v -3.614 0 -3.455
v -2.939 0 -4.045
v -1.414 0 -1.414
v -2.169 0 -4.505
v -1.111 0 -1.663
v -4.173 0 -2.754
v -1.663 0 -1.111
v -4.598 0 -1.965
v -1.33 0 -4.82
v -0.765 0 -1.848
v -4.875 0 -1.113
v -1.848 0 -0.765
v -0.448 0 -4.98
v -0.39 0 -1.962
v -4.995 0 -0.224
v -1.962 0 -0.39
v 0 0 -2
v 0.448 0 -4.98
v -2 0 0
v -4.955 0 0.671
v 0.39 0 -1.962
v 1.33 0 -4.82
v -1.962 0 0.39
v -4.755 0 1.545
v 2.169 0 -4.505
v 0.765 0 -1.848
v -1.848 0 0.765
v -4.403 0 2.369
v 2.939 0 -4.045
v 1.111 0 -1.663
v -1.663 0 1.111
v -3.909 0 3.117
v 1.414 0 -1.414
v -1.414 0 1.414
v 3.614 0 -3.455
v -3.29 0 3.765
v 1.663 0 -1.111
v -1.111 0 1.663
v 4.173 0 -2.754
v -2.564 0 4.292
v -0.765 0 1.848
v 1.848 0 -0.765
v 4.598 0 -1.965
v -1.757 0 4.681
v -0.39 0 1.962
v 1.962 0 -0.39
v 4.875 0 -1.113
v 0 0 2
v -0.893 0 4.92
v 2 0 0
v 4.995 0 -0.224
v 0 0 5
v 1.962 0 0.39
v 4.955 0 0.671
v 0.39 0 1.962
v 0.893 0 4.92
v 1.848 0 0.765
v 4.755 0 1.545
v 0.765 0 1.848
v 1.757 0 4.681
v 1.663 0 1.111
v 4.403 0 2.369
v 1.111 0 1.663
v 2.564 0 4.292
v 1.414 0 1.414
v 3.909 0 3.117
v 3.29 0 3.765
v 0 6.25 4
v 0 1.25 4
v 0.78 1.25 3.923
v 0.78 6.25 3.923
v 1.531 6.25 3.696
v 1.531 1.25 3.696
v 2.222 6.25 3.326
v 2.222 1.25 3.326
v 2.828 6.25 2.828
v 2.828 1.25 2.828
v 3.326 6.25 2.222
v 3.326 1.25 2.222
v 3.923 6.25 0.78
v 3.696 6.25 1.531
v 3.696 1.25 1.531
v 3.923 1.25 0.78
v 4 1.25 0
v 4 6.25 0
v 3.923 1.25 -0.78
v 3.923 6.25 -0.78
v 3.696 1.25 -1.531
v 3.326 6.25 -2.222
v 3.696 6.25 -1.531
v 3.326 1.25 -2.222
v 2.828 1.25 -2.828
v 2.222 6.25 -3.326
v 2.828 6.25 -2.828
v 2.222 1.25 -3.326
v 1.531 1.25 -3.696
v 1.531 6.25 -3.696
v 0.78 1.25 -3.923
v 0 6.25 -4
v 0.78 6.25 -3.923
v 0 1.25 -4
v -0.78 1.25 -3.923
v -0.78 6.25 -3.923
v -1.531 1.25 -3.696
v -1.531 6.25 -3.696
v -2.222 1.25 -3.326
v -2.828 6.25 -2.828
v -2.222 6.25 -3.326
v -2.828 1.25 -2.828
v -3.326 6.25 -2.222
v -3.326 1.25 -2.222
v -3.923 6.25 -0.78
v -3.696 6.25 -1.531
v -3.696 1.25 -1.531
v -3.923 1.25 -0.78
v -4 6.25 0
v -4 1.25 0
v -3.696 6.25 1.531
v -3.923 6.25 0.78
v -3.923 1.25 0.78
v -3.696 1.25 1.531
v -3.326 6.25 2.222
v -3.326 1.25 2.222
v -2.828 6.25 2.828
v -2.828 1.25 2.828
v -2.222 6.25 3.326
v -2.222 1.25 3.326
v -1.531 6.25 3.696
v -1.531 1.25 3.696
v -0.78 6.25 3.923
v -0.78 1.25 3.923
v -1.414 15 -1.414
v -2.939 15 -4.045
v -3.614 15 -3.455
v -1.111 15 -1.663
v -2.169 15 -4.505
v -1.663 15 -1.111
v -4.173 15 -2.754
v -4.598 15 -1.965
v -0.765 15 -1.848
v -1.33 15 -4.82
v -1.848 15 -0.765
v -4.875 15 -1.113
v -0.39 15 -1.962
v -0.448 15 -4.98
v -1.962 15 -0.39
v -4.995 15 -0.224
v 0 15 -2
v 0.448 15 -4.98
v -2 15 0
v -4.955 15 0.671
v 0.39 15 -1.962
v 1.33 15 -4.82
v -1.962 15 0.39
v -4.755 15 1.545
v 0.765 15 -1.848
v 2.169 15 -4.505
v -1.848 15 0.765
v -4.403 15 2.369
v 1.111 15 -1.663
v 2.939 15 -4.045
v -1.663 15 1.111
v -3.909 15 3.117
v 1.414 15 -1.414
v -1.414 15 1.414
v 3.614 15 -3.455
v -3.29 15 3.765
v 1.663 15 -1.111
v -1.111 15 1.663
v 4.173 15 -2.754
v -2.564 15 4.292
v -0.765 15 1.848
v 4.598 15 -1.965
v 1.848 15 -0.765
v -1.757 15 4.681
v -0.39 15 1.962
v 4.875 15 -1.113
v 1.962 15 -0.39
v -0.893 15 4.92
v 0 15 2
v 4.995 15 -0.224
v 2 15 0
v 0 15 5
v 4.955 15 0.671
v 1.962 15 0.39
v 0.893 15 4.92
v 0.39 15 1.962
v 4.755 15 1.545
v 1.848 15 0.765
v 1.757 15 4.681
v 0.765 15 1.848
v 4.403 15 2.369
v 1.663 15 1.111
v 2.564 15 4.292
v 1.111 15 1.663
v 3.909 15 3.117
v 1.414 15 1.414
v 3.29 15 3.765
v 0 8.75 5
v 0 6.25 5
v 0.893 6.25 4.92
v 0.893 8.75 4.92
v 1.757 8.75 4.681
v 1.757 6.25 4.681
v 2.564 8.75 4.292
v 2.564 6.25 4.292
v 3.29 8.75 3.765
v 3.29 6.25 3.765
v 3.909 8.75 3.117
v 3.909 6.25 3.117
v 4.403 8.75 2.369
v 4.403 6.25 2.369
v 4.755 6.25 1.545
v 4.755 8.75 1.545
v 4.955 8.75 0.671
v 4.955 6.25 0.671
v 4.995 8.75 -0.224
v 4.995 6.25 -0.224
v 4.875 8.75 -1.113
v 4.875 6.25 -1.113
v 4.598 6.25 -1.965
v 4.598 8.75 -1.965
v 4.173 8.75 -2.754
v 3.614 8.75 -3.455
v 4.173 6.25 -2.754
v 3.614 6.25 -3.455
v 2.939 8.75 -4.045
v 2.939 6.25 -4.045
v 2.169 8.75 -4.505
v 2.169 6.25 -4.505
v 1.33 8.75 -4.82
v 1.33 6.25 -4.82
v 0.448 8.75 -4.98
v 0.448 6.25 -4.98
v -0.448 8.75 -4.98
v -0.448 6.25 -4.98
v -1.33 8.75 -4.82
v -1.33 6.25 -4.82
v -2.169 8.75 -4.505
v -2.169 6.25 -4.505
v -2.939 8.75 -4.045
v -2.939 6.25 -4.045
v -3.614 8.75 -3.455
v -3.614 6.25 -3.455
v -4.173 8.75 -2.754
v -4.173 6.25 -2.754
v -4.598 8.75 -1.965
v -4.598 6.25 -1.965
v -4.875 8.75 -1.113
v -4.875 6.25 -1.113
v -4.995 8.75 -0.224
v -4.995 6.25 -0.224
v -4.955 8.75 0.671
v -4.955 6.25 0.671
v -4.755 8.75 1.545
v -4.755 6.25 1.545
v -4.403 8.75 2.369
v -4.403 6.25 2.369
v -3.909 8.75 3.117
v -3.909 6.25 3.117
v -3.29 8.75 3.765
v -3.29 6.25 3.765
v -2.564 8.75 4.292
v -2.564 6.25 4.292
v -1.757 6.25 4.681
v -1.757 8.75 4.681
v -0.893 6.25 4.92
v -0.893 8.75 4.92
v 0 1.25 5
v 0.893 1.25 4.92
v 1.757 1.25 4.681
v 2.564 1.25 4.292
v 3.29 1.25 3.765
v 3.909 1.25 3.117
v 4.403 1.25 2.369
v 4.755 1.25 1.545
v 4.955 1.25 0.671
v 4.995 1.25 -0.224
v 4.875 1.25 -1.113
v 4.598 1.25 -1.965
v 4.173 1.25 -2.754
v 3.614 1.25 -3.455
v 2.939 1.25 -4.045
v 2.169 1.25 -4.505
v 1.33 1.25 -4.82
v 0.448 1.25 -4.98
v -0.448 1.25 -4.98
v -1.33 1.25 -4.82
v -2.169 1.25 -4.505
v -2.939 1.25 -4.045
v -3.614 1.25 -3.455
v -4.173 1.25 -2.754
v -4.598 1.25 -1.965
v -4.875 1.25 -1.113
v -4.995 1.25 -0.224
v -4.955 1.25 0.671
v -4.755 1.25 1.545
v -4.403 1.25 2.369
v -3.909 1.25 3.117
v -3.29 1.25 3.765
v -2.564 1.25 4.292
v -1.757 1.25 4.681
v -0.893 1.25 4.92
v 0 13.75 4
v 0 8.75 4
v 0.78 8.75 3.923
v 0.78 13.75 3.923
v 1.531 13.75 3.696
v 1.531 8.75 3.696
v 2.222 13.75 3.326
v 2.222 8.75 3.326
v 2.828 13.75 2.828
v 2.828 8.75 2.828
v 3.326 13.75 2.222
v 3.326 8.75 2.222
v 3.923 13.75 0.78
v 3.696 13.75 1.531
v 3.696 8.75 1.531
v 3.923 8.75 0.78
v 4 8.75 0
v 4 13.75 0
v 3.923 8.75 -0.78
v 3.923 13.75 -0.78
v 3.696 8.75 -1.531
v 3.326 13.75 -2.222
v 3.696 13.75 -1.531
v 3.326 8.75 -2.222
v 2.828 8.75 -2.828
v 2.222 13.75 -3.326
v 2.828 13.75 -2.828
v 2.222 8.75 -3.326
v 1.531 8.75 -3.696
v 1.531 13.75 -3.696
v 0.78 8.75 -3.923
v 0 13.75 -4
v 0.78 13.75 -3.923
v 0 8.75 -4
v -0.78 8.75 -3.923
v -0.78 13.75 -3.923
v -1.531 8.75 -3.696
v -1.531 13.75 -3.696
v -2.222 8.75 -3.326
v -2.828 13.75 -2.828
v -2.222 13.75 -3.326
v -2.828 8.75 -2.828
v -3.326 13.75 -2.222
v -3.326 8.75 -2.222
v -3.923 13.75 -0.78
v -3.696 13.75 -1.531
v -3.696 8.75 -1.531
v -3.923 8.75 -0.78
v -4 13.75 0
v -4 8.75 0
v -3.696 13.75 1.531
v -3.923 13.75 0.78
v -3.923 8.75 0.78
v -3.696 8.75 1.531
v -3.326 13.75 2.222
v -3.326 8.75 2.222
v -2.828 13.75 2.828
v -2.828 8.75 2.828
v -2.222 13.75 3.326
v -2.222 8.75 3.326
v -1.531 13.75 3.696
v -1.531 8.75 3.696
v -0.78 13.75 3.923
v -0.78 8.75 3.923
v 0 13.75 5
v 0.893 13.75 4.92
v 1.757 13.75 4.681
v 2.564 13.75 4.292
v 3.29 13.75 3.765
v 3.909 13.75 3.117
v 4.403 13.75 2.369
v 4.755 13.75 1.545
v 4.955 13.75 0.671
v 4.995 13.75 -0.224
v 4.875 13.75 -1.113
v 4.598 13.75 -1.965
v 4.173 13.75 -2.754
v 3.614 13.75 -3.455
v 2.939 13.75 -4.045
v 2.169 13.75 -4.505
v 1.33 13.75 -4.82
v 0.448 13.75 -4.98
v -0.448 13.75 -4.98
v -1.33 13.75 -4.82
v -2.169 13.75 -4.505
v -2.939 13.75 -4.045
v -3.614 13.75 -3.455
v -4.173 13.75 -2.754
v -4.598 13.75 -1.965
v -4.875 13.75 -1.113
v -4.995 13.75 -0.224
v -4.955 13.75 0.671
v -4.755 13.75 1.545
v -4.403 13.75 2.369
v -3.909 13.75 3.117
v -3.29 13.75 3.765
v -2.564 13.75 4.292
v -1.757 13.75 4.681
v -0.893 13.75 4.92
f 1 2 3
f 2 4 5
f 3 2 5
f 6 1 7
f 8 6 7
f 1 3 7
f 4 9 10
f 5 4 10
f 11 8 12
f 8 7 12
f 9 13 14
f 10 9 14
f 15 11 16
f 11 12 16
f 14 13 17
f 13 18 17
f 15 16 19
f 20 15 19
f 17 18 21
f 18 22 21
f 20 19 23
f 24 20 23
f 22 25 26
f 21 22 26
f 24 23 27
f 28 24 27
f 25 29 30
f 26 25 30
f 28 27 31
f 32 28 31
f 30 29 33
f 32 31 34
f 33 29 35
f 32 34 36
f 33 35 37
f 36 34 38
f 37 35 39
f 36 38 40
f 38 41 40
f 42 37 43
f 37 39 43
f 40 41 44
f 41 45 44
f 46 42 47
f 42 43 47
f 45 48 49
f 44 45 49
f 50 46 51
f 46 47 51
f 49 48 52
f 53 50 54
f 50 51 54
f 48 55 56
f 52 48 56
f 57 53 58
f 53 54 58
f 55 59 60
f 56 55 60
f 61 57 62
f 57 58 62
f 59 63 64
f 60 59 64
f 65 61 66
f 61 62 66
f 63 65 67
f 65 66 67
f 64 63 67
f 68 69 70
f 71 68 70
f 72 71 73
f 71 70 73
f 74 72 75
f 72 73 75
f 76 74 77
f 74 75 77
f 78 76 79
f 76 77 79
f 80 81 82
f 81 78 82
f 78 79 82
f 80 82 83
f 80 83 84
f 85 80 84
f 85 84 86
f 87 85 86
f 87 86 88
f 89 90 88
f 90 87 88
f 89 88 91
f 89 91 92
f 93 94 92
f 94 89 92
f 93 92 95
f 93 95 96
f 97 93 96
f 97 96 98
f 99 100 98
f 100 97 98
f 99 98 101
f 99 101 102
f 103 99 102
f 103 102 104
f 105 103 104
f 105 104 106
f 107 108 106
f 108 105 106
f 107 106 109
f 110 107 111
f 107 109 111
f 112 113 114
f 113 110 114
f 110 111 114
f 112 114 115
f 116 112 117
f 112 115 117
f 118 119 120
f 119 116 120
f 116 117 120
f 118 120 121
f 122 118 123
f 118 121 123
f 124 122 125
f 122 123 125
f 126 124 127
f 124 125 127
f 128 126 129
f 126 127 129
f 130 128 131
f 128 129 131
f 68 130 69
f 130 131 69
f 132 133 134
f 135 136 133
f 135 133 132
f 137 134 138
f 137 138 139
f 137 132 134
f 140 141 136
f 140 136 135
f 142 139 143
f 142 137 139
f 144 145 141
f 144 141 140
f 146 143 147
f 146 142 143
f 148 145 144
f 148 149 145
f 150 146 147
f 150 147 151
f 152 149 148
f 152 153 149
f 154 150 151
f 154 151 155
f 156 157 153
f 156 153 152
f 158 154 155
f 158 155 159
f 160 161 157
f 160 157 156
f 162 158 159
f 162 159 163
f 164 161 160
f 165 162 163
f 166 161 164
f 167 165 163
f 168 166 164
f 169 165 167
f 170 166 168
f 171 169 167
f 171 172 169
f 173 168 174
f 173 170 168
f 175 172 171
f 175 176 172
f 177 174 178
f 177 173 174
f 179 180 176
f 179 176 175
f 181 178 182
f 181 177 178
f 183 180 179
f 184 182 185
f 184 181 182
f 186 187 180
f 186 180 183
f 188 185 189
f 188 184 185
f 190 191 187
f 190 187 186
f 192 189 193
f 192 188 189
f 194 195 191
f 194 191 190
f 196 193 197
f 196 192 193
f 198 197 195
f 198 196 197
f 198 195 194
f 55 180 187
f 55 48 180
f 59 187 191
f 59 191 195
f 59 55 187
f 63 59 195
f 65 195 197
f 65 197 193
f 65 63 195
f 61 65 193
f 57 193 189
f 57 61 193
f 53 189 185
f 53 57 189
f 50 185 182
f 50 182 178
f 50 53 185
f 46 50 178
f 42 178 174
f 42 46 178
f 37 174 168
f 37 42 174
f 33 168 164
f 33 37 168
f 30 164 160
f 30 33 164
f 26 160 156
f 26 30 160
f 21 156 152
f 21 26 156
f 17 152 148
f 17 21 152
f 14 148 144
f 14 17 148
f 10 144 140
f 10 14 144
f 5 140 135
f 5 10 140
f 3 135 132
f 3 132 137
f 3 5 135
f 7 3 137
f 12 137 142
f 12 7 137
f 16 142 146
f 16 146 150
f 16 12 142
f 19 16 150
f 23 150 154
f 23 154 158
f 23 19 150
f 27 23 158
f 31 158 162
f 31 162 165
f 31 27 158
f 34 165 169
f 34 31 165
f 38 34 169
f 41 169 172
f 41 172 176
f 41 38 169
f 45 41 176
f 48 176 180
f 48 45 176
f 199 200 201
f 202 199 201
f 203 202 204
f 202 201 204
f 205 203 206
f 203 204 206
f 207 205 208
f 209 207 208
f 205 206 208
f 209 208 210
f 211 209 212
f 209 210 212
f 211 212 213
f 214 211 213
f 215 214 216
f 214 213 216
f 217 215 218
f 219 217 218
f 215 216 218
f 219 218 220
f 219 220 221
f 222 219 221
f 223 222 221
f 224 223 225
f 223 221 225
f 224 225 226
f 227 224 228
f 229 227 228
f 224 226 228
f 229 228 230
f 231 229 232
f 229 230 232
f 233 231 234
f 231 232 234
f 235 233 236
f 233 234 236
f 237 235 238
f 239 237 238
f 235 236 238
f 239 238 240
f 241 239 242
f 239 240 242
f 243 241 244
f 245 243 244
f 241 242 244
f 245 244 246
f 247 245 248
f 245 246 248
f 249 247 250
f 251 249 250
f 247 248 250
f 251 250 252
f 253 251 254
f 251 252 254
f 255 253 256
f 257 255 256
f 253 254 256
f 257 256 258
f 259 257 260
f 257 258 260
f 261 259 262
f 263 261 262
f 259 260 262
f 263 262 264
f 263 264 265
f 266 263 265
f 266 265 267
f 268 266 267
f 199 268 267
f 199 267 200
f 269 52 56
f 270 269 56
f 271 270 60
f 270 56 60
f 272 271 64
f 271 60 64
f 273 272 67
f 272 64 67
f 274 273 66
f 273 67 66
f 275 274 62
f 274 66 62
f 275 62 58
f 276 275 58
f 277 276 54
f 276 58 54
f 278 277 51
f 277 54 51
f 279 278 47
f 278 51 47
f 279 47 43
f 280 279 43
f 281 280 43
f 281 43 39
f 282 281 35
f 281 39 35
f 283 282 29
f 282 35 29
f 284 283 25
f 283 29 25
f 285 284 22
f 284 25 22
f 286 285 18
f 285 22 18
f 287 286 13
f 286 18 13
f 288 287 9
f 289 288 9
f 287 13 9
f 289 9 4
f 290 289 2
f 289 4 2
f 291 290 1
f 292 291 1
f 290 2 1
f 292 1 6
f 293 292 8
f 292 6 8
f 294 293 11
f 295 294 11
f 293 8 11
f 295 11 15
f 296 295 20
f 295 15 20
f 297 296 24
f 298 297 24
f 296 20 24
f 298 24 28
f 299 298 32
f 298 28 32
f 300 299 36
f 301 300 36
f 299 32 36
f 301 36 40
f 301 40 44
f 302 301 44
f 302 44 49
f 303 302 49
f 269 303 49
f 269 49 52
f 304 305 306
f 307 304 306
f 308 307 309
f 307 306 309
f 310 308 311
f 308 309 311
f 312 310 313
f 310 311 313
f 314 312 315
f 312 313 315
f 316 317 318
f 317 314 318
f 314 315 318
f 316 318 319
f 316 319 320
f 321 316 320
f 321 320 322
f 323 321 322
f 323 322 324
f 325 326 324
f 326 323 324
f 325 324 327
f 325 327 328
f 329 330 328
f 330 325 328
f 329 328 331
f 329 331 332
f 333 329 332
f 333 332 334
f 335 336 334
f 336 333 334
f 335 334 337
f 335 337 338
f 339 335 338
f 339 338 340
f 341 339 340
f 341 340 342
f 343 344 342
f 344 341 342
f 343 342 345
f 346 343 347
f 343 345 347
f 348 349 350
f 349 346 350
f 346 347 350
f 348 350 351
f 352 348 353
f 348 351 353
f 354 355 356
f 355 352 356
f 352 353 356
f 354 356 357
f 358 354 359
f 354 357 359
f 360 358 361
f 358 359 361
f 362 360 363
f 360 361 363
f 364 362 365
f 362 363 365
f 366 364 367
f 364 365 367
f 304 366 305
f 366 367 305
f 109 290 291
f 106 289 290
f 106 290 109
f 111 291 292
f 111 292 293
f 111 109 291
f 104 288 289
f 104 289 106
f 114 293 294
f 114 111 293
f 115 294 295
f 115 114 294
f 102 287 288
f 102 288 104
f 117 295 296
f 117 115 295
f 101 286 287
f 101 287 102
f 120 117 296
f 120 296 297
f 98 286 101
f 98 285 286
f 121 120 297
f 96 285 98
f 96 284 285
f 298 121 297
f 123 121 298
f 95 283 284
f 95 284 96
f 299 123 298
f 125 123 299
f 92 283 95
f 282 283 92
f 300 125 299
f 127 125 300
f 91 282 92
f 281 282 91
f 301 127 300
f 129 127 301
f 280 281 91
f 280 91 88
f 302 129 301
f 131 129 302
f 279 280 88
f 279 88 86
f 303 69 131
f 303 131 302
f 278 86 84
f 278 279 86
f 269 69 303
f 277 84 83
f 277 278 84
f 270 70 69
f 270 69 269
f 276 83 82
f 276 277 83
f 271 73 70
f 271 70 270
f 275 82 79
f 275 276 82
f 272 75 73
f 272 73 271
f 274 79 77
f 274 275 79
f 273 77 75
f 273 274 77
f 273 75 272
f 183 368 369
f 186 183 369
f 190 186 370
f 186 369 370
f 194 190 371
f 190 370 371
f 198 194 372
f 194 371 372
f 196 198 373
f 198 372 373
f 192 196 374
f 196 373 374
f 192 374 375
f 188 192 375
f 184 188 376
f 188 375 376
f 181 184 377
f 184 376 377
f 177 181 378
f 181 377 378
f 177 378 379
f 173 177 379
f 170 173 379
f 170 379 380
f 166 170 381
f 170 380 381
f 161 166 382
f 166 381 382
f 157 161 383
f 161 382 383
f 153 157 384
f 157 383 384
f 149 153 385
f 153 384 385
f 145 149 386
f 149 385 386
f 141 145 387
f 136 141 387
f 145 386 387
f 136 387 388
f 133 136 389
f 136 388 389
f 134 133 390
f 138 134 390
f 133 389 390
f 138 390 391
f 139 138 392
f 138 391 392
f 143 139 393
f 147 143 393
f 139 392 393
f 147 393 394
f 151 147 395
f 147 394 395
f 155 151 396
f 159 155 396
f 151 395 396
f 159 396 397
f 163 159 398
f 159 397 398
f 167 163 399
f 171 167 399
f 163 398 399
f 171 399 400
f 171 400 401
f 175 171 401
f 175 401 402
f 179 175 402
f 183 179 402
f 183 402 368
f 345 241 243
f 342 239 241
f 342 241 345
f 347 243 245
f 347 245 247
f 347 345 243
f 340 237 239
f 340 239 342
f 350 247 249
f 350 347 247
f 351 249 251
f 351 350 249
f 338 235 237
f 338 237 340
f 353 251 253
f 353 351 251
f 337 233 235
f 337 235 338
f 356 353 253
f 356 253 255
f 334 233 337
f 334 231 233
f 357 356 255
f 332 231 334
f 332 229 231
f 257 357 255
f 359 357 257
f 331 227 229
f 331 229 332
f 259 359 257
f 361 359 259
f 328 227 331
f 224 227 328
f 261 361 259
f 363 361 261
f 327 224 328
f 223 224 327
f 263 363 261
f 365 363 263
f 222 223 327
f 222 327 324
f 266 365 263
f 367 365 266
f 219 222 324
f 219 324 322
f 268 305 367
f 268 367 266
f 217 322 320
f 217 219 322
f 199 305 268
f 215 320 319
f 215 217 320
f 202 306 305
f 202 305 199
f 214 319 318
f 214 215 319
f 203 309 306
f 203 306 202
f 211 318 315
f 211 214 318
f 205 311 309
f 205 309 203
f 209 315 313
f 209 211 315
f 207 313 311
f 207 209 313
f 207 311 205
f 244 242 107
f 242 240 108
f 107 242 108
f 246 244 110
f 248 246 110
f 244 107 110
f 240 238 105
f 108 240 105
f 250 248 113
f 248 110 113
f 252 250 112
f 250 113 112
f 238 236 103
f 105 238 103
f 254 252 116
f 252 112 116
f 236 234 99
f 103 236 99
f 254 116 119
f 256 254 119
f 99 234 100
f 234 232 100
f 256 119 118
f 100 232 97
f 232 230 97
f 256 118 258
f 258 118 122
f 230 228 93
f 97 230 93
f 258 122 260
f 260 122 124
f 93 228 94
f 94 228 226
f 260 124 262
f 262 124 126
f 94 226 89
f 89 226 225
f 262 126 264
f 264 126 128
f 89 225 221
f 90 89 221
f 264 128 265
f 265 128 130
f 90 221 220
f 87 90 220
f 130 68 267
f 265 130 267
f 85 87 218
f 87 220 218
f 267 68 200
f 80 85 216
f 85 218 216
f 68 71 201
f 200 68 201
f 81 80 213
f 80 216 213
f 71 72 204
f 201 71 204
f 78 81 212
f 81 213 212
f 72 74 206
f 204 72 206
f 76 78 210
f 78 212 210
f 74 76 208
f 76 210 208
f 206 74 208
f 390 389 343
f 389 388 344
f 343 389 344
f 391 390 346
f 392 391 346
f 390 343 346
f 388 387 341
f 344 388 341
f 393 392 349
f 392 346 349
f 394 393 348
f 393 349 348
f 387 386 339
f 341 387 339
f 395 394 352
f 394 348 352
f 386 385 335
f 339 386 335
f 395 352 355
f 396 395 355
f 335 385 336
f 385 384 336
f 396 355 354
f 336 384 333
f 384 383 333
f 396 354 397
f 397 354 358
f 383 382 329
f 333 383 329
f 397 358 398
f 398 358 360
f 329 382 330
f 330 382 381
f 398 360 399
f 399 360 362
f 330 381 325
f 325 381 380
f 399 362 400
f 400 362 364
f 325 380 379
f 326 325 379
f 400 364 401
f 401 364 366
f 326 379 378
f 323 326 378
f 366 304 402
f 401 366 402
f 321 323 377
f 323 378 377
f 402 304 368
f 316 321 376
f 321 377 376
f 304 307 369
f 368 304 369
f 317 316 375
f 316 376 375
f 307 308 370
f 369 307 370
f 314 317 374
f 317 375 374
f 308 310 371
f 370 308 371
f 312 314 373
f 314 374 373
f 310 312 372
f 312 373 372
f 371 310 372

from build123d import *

# Parameters (mm, degrees)
ESQUISSE1_R        = 4
ESQUISSE1_R_2      = 2
BOSS_EXTRU_1_DEPTH = 15
ESQUISSE2_R        = 5
ESQUISSE2_R_2      = 2
BOSS_EXTRU_2_DEPTH = 1.25
ESQUISSE3_R        = 5
ESQUISSE3_R_2      = 2
BOSS_EXTRU_3_DEPTH = 2.5
BOSS_EXTRU_5_START = -1.25
ESQUISSE5_R        = 5
ESQUISSE5_R_2      = 2
BOSS_EXTRU_5_DEPTH = 1.25


with BuildPart() as part:
    # Esquisse1 → Boss.-Extru.1 (new body)
    with BuildSketch(Plane(origin=(0, 0, 0), x_dir=(1, 0, 0), z_dir=(0, 1, 0))):
        with Locations(Location((0, 0, 0), (0, 0, 270))):
            Circle(ESQUISSE1_R)
        with Locations(Location((0, 0, 0), (0, 0, 270))):
            Circle(ESQUISSE1_R_2, mode=Mode.SUBTRACT)
    extrude(amount=BOSS_EXTRU_1_DEPTH)

    # Esquisse2 → Boss.-Extru.2 (add)
    with BuildSketch(Plane(origin=(0, 0, 0), x_dir=(1, 0, 0), z_dir=(0, 1, 0))):
        with Locations(Location((0, 0, 0), (0, 0, 270))):
            Circle(ESQUISSE2_R)
        with Locations(Location((0, 0, 0), (0, 0, 270))):
            Circle(ESQUISSE2_R_2, mode=Mode.SUBTRACT)
    extrude(amount=BOSS_EXTRU_2_DEPTH)

    # Esquisse3 → Boss.-Extru.3 (add)
    with BuildSketch(Plane(origin=(0, 6.25, 0), x_dir=(1, 0, 0), z_dir=(0, 1, 0))):
        with Locations(Location((0, 0, 0), (0, 0, 270))):
            Circle(ESQUISSE3_R)
        with Locations(Location((0, 0, 0), (0, 0, 270))):
            Circle(ESQUISSE3_R_2, mode=Mode.SUBTRACT)
    extrude(amount=BOSS_EXTRU_3_DEPTH)

    # Esquisse5 → Boss.-Extru.5 (add)
    with BuildSketch(Plane(origin=(0, 15, 0), x_dir=(1, 0, 0), z_dir=(0, 1, 0)).offset(BOSS_EXTRU_5_START)):
        with Locations(Location((0, 0, 0), (0, 0, 270))):
            Circle(ESQUISSE5_R)
        with Locations(Location((0, 0, 0), (0, 0, 270))):
            Circle(ESQUISSE5_R_2, mode=Mode.SUBTRACT)
    extrude(amount=BOSS_EXTRU_5_DEPTH)


solid = part.part
